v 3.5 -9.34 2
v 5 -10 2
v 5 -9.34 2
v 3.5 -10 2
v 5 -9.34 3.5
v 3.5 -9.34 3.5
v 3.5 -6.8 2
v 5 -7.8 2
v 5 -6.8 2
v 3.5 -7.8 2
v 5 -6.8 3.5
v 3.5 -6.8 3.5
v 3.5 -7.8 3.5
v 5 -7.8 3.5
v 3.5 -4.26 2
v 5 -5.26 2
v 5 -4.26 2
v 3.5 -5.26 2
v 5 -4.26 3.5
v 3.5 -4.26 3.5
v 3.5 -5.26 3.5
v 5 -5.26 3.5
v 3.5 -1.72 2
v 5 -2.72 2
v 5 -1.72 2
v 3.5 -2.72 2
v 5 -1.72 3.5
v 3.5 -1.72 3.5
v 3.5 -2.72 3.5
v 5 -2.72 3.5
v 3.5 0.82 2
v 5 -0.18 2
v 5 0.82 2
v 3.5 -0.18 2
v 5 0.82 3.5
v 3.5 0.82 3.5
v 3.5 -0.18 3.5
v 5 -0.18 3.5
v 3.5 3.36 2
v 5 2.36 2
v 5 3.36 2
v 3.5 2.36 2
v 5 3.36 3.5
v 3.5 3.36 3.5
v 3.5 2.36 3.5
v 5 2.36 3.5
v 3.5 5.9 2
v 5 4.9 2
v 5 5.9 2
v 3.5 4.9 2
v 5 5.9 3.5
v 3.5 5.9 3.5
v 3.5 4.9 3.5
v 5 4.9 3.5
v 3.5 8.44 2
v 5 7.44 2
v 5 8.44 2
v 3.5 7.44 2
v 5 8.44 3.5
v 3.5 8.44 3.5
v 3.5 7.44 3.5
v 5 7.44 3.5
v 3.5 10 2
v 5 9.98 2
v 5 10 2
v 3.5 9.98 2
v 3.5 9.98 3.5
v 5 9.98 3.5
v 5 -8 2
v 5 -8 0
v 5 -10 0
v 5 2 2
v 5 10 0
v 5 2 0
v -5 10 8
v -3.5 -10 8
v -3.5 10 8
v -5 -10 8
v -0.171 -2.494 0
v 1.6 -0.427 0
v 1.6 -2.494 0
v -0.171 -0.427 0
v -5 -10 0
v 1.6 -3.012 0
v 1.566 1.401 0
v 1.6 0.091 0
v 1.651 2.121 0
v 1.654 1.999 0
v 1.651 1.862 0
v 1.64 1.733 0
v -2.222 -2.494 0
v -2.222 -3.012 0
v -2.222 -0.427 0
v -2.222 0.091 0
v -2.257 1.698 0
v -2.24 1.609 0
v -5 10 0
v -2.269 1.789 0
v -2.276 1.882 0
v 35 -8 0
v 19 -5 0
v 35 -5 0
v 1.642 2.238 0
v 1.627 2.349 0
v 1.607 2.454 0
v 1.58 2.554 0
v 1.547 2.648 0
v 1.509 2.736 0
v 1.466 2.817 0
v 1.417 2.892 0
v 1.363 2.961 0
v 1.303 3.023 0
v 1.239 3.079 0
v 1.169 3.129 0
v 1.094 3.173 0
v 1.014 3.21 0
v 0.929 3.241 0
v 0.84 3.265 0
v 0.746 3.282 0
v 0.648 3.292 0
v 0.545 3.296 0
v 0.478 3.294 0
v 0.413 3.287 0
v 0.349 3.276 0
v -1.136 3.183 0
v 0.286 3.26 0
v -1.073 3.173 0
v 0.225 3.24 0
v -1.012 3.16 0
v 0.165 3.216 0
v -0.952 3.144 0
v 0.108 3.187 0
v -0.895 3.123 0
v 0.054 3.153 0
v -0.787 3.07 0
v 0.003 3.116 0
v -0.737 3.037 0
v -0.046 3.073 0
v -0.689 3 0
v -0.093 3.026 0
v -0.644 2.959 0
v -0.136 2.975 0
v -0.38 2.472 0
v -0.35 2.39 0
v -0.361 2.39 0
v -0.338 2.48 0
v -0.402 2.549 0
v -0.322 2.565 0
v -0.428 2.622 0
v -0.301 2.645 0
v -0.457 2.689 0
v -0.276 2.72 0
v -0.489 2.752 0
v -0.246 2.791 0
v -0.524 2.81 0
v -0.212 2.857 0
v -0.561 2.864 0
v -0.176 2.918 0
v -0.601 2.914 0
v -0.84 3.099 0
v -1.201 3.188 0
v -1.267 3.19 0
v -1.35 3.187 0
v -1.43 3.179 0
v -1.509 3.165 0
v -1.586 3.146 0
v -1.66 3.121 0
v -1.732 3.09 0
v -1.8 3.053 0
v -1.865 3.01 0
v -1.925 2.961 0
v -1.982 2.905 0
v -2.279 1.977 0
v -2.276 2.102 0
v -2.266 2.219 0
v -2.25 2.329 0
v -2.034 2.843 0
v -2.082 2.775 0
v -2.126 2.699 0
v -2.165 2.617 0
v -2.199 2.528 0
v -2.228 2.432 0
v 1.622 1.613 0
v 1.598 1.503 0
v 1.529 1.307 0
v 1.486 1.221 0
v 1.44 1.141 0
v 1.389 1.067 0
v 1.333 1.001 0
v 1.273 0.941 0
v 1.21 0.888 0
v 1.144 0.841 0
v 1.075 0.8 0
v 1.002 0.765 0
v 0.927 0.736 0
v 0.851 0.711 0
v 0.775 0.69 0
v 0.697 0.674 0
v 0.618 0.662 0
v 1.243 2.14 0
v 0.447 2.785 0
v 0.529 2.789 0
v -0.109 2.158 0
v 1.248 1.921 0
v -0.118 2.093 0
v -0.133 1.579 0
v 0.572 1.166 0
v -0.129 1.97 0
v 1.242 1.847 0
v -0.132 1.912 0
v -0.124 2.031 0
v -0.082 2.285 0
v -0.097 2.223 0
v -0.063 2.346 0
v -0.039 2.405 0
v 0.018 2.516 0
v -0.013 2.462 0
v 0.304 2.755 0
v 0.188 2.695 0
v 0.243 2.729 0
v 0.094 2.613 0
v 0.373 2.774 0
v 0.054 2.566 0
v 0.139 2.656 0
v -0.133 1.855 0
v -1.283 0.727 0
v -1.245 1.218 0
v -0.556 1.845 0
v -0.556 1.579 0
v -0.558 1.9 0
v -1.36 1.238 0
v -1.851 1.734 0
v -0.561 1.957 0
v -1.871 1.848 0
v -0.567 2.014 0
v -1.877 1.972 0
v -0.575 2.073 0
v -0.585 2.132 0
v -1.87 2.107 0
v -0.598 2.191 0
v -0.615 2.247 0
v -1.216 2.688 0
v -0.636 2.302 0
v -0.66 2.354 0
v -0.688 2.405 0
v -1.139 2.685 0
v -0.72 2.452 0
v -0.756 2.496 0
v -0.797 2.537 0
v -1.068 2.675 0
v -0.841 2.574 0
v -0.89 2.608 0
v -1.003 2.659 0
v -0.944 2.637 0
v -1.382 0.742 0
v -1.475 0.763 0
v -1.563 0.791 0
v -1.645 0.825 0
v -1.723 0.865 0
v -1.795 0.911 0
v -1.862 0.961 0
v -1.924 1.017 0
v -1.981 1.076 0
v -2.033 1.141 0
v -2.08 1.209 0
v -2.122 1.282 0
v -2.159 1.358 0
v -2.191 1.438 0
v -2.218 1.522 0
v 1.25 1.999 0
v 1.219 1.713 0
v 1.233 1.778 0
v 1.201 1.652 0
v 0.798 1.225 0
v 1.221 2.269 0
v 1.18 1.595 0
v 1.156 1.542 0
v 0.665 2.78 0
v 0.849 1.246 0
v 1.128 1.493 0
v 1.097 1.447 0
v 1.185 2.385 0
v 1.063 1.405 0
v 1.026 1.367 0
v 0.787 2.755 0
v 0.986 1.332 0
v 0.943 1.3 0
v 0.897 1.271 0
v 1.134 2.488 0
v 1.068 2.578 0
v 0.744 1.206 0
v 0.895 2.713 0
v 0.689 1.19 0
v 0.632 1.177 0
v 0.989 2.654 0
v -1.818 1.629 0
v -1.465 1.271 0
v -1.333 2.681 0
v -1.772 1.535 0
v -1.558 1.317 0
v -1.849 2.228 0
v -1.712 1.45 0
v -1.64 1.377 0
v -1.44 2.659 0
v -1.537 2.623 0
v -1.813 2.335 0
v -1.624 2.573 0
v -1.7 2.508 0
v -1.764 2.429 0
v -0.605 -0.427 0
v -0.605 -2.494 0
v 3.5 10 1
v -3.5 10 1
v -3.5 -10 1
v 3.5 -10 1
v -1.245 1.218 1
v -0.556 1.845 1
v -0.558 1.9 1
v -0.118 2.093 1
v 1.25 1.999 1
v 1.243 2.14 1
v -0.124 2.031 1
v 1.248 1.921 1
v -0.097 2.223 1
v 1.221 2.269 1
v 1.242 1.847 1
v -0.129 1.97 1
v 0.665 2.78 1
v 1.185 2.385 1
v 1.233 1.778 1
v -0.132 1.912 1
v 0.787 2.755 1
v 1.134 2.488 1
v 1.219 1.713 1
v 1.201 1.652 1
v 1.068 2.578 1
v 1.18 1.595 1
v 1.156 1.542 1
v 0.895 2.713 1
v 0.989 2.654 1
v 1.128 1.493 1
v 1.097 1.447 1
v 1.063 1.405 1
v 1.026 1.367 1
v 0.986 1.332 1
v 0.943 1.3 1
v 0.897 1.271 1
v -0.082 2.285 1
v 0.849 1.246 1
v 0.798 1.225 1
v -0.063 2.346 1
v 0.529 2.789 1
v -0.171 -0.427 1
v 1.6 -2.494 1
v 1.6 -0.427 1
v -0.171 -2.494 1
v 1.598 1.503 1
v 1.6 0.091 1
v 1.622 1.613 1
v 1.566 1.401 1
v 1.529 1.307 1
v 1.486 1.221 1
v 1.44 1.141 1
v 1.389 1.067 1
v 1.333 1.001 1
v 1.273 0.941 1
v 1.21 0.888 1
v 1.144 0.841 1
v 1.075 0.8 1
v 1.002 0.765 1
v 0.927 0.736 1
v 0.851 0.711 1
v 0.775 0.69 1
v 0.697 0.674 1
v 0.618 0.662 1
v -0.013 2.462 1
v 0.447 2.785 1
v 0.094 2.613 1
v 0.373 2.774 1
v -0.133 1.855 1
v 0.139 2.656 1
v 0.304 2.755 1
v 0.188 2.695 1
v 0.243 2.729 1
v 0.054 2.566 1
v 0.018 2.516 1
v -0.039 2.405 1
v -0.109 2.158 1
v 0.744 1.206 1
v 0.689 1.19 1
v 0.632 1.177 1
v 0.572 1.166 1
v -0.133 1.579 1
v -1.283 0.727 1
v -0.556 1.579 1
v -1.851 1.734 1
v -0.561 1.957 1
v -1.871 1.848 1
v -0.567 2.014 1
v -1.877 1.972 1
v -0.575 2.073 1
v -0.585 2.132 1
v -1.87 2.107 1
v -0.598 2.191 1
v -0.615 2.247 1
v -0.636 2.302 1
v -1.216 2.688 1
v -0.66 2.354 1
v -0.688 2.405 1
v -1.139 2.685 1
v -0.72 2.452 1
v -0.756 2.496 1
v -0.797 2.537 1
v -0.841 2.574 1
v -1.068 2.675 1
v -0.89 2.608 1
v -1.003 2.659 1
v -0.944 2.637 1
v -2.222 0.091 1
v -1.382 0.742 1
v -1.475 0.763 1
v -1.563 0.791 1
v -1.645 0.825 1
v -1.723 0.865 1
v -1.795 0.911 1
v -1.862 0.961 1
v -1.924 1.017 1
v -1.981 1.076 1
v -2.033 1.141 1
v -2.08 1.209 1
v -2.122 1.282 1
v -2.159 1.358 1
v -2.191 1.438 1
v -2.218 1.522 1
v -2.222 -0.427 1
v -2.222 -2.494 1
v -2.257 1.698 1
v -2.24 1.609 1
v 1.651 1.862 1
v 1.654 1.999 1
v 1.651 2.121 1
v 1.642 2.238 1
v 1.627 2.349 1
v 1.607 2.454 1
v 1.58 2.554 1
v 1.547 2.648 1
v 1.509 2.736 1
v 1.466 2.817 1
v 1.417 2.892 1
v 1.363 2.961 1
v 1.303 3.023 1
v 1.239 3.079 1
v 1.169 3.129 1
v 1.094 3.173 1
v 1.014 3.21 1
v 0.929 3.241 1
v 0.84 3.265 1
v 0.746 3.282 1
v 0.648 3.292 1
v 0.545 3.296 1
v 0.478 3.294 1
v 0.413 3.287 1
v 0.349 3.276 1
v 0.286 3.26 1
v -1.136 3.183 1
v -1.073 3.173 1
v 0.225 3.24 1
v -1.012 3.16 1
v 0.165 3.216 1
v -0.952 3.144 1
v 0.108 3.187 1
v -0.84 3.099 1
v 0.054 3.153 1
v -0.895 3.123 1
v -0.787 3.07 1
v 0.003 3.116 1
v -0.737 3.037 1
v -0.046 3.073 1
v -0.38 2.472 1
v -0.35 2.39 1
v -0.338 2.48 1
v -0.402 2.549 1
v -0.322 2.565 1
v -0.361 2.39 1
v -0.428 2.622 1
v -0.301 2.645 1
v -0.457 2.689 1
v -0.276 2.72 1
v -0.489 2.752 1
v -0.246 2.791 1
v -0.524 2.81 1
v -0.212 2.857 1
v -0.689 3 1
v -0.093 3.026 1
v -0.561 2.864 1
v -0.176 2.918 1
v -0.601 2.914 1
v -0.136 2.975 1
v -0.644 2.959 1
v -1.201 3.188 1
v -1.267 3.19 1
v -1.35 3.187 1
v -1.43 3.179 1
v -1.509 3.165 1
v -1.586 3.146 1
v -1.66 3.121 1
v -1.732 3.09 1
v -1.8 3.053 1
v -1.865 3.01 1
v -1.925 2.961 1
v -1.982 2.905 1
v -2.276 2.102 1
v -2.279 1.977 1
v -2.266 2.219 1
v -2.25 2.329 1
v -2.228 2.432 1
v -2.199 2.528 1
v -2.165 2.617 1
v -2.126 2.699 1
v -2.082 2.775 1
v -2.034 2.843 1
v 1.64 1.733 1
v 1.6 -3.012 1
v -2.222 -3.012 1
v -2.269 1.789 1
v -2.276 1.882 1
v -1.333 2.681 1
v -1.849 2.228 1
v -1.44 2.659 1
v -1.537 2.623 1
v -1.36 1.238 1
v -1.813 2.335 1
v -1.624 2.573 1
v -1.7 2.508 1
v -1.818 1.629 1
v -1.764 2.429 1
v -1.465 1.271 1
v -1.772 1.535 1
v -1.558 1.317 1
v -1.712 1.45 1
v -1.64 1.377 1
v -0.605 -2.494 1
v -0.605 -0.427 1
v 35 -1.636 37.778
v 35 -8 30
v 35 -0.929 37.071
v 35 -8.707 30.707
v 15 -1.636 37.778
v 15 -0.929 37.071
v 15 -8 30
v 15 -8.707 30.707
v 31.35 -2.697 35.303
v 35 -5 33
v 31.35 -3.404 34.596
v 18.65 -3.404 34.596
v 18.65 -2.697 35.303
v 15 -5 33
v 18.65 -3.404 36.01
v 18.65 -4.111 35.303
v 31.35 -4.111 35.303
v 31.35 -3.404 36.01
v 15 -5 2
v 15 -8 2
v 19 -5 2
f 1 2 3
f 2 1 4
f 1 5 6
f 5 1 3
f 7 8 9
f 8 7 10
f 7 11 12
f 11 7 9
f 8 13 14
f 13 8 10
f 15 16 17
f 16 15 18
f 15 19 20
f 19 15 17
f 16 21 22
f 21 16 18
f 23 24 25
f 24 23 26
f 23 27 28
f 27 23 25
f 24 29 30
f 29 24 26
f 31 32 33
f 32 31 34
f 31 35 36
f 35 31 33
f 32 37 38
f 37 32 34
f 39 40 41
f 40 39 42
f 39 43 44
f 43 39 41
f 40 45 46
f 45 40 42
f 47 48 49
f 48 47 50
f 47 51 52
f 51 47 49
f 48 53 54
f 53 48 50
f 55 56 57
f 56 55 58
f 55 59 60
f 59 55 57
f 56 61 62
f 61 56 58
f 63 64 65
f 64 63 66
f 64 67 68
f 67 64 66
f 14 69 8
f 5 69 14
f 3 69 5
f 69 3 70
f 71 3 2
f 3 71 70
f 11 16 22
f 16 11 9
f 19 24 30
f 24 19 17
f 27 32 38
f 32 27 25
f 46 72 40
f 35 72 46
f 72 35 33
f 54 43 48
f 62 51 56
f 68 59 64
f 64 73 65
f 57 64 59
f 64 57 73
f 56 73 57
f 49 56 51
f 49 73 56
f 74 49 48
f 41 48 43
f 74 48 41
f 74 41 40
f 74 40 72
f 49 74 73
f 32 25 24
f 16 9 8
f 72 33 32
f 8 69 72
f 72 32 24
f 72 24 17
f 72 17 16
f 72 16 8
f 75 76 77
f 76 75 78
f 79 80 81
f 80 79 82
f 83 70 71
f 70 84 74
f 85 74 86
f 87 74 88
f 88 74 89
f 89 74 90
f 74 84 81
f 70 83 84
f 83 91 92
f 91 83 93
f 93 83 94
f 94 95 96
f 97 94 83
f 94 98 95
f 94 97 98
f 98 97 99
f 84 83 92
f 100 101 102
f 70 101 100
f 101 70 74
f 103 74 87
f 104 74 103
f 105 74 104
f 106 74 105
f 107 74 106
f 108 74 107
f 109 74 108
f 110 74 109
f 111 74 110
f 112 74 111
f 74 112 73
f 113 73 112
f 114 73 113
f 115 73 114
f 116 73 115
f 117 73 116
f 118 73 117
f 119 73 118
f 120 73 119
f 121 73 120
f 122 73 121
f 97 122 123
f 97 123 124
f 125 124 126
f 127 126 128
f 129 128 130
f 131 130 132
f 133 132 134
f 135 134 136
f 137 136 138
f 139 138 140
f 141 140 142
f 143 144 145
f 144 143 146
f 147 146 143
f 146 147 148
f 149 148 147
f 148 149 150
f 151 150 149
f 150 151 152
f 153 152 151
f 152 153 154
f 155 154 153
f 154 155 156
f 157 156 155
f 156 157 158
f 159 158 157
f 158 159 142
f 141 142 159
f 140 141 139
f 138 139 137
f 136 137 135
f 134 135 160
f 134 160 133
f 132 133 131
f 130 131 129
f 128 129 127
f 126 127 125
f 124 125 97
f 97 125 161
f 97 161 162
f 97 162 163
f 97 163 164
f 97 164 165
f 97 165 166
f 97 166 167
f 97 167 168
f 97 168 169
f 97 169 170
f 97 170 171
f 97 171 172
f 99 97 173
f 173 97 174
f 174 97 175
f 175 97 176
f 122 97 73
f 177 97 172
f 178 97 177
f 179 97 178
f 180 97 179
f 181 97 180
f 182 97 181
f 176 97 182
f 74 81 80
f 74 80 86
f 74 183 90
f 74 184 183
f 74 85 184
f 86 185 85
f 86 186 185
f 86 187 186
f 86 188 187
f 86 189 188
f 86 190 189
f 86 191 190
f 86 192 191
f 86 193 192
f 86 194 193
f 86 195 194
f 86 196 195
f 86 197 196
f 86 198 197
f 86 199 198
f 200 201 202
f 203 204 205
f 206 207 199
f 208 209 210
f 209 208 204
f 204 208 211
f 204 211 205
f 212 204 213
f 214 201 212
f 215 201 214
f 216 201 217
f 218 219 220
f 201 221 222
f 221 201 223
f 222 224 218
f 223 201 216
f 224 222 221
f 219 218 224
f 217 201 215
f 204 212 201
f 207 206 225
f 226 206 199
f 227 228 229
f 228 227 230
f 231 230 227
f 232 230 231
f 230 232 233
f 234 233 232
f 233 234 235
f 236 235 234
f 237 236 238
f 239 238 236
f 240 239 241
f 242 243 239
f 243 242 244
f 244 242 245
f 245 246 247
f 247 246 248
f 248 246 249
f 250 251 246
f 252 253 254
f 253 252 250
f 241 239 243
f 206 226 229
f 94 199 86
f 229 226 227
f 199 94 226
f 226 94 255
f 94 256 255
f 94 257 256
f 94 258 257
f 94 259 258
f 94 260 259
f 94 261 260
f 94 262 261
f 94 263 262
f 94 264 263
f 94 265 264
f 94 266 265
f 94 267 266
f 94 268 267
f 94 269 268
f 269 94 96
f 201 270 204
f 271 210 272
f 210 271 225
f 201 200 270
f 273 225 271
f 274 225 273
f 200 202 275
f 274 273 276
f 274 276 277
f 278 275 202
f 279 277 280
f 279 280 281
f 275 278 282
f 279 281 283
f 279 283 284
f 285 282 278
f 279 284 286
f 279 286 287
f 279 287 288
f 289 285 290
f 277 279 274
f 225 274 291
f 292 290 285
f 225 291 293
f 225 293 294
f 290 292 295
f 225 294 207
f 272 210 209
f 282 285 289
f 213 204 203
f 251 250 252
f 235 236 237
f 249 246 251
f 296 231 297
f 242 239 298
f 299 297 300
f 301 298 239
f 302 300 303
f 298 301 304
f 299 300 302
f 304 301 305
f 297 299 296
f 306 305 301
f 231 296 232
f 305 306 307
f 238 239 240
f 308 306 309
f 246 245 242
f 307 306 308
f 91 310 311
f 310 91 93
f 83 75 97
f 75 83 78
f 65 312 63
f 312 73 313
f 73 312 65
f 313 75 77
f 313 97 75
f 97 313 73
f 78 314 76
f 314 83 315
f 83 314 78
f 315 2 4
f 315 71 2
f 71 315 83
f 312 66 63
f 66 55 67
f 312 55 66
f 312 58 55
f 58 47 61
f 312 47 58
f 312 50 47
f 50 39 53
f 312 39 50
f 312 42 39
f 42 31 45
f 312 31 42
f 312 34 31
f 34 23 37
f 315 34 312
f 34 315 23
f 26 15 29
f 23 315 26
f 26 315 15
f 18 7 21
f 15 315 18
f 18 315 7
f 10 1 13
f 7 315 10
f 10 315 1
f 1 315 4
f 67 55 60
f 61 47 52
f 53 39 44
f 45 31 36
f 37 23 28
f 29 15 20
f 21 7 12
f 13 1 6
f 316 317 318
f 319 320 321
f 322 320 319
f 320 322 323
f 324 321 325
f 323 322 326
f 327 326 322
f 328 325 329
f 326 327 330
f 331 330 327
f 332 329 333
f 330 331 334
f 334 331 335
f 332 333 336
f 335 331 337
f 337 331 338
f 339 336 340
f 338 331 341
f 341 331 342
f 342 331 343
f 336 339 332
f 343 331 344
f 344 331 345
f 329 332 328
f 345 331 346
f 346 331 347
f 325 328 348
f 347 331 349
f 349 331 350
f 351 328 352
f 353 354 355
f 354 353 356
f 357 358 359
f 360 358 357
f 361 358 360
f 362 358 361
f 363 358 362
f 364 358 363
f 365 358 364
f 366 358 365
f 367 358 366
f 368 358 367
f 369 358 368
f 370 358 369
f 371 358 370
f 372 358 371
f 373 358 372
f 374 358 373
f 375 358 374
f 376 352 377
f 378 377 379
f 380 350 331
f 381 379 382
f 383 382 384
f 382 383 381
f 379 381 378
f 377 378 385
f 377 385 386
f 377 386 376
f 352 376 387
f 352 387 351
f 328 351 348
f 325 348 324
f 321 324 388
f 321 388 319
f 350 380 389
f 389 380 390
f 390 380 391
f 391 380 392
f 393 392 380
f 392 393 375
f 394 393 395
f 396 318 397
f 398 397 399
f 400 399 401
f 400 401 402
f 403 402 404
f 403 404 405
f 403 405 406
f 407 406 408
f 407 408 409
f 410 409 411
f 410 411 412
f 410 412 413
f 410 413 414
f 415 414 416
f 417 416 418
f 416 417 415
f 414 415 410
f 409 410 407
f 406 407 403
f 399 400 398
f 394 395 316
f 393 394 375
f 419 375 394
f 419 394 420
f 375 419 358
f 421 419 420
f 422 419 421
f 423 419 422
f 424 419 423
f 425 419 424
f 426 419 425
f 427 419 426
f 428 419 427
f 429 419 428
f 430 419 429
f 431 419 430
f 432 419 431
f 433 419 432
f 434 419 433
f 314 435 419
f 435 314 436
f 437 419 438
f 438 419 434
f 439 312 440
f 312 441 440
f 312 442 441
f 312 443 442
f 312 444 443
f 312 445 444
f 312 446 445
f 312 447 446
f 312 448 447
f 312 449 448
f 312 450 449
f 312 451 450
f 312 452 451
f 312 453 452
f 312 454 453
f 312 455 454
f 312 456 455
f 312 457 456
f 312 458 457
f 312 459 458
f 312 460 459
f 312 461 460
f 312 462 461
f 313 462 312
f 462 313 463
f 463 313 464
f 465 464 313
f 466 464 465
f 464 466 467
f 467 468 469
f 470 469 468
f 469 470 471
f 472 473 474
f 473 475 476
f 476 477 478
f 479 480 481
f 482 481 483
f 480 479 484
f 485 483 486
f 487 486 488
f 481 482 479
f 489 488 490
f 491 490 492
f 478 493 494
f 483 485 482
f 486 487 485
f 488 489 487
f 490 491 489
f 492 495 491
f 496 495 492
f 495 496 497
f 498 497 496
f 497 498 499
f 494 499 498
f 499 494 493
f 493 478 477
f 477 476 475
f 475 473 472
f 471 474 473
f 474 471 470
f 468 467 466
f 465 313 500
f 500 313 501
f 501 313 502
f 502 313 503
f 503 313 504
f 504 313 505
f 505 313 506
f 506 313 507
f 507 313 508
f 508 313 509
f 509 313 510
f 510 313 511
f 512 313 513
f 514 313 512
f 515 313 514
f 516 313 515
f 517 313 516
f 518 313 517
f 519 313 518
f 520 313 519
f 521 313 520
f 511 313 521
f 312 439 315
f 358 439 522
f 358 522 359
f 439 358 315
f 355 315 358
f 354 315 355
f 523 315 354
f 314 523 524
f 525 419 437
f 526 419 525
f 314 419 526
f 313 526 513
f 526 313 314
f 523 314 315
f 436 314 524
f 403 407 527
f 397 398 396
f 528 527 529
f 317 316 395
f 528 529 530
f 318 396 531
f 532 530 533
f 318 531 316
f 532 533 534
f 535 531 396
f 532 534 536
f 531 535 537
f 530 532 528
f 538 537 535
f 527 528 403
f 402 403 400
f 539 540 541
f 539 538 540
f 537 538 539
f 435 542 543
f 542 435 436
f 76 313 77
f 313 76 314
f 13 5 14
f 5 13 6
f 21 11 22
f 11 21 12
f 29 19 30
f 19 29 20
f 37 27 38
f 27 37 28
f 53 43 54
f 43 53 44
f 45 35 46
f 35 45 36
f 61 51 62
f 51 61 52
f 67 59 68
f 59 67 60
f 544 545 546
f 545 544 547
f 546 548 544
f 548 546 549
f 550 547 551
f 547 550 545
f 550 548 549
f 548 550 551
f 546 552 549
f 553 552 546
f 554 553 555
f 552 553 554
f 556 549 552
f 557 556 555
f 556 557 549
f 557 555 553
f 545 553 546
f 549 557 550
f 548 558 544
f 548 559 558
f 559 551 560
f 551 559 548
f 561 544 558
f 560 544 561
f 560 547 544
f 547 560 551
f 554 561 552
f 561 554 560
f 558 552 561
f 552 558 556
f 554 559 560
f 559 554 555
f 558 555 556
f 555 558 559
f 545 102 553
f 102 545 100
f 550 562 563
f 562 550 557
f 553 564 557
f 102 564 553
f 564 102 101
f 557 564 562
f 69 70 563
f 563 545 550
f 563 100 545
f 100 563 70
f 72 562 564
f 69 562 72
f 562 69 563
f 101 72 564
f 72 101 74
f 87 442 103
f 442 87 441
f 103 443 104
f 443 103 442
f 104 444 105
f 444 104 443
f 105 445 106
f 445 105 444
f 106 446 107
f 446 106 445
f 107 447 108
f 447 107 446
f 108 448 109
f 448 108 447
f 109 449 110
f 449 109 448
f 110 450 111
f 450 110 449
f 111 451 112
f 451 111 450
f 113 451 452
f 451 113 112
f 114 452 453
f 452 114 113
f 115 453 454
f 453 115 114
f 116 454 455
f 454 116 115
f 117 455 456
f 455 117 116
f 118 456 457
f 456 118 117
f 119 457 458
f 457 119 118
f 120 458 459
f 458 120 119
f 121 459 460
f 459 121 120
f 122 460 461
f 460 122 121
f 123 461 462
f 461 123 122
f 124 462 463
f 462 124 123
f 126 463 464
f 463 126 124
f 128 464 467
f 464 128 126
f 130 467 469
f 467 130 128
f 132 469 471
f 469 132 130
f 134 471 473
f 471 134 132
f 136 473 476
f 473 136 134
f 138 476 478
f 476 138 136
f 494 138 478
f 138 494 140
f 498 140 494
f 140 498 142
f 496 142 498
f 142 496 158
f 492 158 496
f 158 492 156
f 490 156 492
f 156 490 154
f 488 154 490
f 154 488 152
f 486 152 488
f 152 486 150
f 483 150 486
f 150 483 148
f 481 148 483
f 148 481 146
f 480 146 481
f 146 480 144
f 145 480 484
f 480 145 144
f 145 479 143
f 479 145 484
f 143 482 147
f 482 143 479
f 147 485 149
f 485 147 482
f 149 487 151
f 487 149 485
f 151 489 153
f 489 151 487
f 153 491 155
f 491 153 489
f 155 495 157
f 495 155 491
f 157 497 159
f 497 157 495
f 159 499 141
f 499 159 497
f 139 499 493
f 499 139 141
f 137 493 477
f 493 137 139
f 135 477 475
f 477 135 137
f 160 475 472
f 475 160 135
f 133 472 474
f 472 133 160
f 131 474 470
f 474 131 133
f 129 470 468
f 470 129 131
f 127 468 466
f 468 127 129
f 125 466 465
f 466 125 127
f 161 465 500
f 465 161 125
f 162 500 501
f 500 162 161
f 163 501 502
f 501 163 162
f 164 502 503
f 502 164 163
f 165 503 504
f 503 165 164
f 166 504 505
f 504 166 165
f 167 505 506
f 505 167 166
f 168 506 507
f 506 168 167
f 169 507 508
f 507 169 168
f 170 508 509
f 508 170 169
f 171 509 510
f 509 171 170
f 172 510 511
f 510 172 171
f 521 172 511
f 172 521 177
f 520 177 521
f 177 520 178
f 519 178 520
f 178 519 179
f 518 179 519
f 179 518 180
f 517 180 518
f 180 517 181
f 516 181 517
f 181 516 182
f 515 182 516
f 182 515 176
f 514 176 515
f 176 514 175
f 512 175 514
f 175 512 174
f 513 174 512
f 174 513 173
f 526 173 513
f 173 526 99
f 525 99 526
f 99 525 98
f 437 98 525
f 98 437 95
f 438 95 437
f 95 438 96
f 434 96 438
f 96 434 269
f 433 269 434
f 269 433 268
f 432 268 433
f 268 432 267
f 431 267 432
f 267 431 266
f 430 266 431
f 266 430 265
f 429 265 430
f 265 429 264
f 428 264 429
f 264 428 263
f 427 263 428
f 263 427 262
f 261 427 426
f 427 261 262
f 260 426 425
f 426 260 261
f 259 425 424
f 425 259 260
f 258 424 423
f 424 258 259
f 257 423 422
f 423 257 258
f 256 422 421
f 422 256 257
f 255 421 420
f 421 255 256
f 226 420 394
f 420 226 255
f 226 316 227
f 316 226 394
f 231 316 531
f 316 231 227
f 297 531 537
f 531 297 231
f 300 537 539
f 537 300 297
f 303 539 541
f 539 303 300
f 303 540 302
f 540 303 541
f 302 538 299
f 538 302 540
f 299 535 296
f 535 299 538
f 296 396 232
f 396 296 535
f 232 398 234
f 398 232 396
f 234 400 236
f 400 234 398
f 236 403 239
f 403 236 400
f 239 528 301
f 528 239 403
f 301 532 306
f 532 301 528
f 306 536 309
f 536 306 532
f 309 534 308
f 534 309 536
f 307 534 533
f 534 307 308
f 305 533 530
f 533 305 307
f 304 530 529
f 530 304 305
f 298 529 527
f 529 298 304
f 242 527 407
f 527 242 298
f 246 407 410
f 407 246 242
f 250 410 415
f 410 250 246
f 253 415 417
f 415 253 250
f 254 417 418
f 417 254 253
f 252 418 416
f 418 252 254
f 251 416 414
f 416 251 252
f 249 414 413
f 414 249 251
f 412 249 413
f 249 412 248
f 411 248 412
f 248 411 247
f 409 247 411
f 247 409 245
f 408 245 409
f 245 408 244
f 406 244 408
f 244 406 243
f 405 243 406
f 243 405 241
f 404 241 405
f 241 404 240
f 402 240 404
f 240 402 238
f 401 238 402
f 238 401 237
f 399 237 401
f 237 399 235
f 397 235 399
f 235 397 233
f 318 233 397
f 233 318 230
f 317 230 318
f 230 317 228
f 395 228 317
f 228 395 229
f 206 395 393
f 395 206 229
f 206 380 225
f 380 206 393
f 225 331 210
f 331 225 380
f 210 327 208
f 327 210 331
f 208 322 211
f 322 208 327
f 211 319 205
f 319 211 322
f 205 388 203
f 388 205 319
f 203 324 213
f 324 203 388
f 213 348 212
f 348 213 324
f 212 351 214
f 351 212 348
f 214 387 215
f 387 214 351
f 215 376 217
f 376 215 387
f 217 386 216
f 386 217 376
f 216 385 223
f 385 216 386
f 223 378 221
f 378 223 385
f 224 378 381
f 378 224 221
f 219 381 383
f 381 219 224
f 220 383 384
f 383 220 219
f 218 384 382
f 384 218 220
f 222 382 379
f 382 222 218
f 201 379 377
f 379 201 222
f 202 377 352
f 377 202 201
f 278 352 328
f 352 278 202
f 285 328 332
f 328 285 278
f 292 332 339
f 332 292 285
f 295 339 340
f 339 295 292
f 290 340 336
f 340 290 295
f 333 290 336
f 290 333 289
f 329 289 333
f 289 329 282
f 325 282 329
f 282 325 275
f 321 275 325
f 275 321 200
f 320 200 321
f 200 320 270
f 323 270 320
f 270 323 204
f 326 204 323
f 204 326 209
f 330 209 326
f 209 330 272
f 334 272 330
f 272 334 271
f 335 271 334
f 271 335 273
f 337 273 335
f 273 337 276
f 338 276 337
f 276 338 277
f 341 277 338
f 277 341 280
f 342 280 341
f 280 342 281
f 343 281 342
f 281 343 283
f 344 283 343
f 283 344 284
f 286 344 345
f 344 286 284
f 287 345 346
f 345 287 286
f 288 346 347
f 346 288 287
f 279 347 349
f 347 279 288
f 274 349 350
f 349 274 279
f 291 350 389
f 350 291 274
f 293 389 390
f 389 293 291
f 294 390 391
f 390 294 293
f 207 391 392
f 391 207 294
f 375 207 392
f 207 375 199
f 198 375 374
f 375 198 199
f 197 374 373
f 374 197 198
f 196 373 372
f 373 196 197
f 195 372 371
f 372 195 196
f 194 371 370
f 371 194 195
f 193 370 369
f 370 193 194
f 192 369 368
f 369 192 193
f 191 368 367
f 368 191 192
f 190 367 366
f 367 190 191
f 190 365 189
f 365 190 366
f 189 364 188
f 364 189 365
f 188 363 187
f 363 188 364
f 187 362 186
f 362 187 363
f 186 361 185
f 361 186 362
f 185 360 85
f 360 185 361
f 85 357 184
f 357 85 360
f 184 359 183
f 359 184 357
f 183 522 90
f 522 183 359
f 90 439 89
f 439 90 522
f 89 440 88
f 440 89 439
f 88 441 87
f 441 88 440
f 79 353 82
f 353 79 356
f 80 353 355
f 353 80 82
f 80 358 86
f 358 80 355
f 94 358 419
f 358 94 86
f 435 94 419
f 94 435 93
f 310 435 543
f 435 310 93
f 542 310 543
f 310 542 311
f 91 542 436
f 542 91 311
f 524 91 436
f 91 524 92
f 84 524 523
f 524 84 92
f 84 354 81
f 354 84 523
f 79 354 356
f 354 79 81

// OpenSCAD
// ESP32 -VEML7700 support parametric model
//   
//    syntax: 
//        //Description
//        variable=value; //Parameter
//        
//        This type of comment tells the name of group to which parameters below
//        this comment will belong 
//    
//       /*[ group name ]*/ 
//
//Below comment tells the group to which a variable will belong

/*[Properties of the ESP support]*/

//The depth of the ESP32 Feather support
ESP_depth = 200;//[150 : 800]


/*[Properties of the VEML support]*/

//The angle of the VEML support
VEML_angle = 45;//[0 : 90]

//The altitude of the VEML support
VEML_altitude = 30;//[10:55]

//The X shift of the VEML support
link_shift_X = 10;//[0 :20]

//The Y shift of the VEML support
link_shift_Y = -5;//[-20 :20]


/*[ Content To be written ] */

//Text to be engraved 
Message = "H3"; //["AB","CD...", "pqr", "XYZ"]

//Text scale
text_scale = 0.4;


/*[ Rendering settings ] */

//Facet angle
$fa = 4;
//Facet size
$fs = 2; 


/* [Hidden] */ // non-parametric values

//The width of the ESP32 Feather support
ESP_width = 100;//[50 : 500]
//The height of the ESP Feather support
ESP_height = 80;//[10 : 200]
//The thickness of the ESP32 Feather 
ESP_thickness = 70;//[50 : 200]
//The vertical shift of the ESP32 Feather 
ESP_shift = 10;//[10 : 100]

// ESP support pin comb lower height
ESP_comb_height1=40;   
// ESP support pin comb higher height
ESP_comb_height2=70;   
// ESP support pin comb width
ESP_comb_width=ESP_width-ESP_thickness+10;
// ESP support pin comb depth
ESP_comb_depth=10; 

//The depth of the VEML support
VEML_depth = 10;//[50 : 200]
//The width of the VEML support
VEML_width = 200;//[100 : 500]
//The height of the VEML support
VEML_height = 100;//[10 : 200]
//The vertical shift of the VEML pin through 
VEML_shift = 20;//[10 : 100]
// VEML pillar thickness
VEML_thickness = 3;//[2:5]


// The space between the pins (norm = 2.54)
pin_space = 2.54;

// ESP support
module esp_support() {
scale([0.1, 0.1, 0.1])
    translate([0,0,ESP_height/2])
    difference() {
        // base U shape
        cube([ESP_width,ESP_depth,ESP_height], center = true);
        translate([0, 0,ESP_shift])
            cube([ESP_thickness,ESP_depth+10,ESP_height], center=true);
        // cubes to cut comb dents
        translate([ESP_thickness/2,0,0])
            for (dy=[-ESP_depth*10:pin_space*100:ESP_depth*10]) {
                translate([0,dy/10,ESP_comb_height1/2])
                    cube([ESP_comb_width,ESP_comb_depth,ESP_height],center=true);
            };
        // cube to cut at comb height    
        translate([ESP_width/2,0,ESP_comb_height2/2])
            cube([ESP_width,ESP_depth+10,ESP_height],center=true);
    }
}

// VEML support
module veml_support(thick,height) {
    translate([0,0,VEML_altitude]) {
        // uncomment to get rid of supports //translate([0,VEML_depth/10*cos(VEML_angle),VEML_depth/10*cos(VEML_angle)/tan(VEML_angle)])
        rotate([-VEML_angle,0,0])
        //VEML_height/2*cos(VEML_angle)
        scale([0.1, 0.1, 0.1]) 
        translate([0,-VEML_depth/2,VEML_height/2])
        difference() {
            // support plate
            cube([VEML_width,VEML_depth,VEML_height], center = true);
            // opening in support
            translate([0, 0,VEML_shift])
                cube([5*pin_space*10.0,VEML_width+10,10], center=true);
        } 
        
        // pillar with precise angle cut
        translate([0,thick/2,(-height+thick/tan(VEML_angle))/2])
        difference() {
            cube([VEML_width/10,thick,height+thick/tan(VEML_angle)], center=true);
            translate([0,0,(height+thick/tan(VEML_angle))/2])
                rotate([-VEML_angle,0,0])
                cube([100,thick*cos(VEML_angle),100],center=true);
        }
    }
}

// link between ESP and VEML support
module link(shiftX) {
translate([0,-VEML_thickness,0])
    // simple extrusion of a triangle that extends into the support pillar
    linear_extrude(height=2)
    polygon([[0,0],[shiftX+10,0],[0,10]]);
}

// text
module text_engraved() {
translate([0,0,-2.5])
    scale([text_scale,text_scale,text_scale])
    rotate([0,0,90])
    linear_extrude(height = ESP_shift+10) {
        translate([0, -4]) text(Message, halign = "center");
    }
}

// whole model
difference() {
    union() {
        esp_support();
        translate([ESP_width/20,link_shift_Y,0]) {
            translate([VEML_width/20+link_shift_X,-VEML_thickness,0])
            veml_support(VEML_thickness,VEML_altitude);
            link(link_shift_X);
        }
    };
    text_engraved();
}
